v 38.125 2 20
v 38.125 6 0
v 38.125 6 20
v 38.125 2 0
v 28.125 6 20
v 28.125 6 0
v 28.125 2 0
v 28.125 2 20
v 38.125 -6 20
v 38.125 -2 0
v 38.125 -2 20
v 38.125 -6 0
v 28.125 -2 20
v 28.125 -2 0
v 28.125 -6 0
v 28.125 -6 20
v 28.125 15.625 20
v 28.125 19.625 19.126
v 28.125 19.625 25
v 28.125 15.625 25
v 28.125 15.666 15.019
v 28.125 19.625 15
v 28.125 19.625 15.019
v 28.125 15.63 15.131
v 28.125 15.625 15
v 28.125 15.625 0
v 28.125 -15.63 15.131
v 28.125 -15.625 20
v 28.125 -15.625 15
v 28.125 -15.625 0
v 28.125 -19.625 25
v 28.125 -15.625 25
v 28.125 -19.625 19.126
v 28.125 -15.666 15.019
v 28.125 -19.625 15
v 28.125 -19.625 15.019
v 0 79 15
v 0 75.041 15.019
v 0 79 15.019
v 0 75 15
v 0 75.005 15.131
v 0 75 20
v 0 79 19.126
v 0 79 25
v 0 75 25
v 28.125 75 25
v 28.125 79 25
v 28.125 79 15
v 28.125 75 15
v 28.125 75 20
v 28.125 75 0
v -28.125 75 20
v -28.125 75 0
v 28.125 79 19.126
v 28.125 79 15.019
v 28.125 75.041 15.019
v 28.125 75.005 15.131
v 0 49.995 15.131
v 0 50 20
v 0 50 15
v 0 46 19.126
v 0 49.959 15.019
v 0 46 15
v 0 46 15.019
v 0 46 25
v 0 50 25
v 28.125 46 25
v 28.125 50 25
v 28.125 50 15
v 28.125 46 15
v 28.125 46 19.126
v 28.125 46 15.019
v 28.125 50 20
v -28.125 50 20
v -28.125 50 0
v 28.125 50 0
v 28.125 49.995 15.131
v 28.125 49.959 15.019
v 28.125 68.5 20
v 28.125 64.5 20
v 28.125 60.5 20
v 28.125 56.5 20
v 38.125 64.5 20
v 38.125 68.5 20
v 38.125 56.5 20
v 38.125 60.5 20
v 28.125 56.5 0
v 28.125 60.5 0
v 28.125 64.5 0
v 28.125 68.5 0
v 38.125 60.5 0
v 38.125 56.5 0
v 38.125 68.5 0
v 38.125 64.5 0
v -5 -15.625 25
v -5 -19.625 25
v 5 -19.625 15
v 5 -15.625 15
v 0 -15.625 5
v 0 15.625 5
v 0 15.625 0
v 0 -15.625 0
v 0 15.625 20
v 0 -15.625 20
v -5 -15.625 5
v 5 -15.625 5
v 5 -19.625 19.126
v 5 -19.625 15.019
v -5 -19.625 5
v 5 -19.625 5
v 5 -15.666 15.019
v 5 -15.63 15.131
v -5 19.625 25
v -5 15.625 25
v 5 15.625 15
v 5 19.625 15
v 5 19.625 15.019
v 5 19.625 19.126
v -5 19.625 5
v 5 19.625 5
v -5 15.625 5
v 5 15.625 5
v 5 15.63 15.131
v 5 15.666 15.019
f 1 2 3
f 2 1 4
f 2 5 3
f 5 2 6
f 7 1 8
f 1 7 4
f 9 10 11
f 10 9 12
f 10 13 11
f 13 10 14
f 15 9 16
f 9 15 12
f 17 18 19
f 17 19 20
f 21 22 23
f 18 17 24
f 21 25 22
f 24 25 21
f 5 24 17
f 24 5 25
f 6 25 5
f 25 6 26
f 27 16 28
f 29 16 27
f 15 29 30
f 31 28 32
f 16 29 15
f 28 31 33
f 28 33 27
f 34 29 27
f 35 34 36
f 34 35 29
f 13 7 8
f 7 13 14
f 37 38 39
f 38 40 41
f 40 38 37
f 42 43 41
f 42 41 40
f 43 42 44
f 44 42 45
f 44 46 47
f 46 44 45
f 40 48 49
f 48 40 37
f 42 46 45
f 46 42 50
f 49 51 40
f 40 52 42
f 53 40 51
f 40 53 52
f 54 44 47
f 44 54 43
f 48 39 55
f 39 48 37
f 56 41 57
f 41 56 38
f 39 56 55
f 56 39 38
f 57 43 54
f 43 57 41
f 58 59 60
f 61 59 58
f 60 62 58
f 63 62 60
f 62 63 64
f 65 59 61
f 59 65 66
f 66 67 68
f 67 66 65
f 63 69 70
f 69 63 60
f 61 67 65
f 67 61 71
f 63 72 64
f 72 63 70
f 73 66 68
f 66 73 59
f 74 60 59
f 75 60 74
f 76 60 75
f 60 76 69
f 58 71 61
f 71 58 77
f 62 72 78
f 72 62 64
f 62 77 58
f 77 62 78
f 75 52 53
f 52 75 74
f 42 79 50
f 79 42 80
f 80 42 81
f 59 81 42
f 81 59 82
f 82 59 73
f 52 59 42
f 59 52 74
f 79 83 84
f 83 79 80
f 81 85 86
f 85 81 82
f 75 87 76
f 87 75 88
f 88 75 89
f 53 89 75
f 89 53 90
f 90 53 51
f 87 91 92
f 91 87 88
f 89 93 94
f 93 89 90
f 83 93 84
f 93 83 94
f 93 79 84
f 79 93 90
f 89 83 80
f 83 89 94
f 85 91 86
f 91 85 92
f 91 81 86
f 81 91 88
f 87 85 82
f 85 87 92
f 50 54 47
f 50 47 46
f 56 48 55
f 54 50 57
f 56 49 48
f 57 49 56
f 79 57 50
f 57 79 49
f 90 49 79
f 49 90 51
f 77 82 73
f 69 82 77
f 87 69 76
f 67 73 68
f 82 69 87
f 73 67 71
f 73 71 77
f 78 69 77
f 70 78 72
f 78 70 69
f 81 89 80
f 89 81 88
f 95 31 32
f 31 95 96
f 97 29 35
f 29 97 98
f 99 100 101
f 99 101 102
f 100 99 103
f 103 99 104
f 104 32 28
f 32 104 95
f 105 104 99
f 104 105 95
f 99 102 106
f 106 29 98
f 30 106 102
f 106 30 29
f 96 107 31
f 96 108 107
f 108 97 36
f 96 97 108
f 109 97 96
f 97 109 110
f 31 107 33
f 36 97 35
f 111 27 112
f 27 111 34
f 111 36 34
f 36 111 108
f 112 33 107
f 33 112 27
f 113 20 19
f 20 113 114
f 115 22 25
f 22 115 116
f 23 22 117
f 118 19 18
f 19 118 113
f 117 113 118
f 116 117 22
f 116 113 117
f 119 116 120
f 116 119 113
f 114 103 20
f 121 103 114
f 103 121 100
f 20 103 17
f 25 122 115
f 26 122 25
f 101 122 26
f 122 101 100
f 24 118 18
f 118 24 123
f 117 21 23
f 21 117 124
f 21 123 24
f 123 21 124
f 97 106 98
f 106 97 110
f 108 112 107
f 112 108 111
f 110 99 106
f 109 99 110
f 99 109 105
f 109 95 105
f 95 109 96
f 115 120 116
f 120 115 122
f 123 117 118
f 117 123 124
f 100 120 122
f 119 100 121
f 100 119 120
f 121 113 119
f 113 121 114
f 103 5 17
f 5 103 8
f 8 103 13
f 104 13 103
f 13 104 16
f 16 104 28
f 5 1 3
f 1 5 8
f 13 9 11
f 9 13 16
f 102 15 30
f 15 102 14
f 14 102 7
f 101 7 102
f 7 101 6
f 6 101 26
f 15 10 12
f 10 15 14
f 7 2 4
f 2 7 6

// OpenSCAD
// Goal: AC unit window mount for vertical sliding gap. Holds a piece of cardboard above an AC unit to block airflow out the window.
// Result: Abandoned. Needed to print too many of these to test. Seemed unresonable compared to getting a piece of wood cut to size.

// distance the window is opened for the AC to fit inside
WidthOfAcGap = 14.5 * 25; // inches times 2.5 = mm

// depth of the window frame. How wide the opening is that the window slides into.
WidthOfFrame = 1.25 * 25;

// thickness of the edge of the sliding window. This fits inside of WidthOfFrame.
WidthOfWindow = 1 * 25;

// How deep the window slides into the frame
DepthFrame = 1.125 * 25;

// How thick the rectangular sheet of cardboard or wood is that will be inserted into the couplers.
ThicknessFillerMaterial = 4;

/* [Hidden] */
// Remaining variables are hidden from Thingiverse

// height of stackable blocks
BlockHeight = 20; // mm

// thickness of snap to above
SnapDepth = 4;

// Height of snap to above
SnapHeight = 10;

//
// End of variables - Start of shapes
//

// The side meant to go into the frame of the window
translate([0, 2*WidthOfFrame, 0])
  Male();

// the side meant to recieve the window edge
Female();

//StackableBlock(WidthOfWindow);

// https://youtu.be/c1LKQaFIPNA use cornerRadius of 0.1 for sharp corners
module rightTriangle(side1, side2, extrudeHeight, cornerRadius){
  translate([cornerRadius,cornerRadius,0])
    hull(){
      cylinder(r=cornerRadius,h=extrudeHeight);
      translate([side1-cornerRadius*2,0,0]) cylinder(r=cornerRadius, h=extrudeHeight);
      translate([0,side2-cornerRadius*2,0]) cylinder(r=cornerRadius, h=extrudeHeight);
    }
}

module Male(){
  difference(){
    rotate([0,0,180])
      translate([-(WidthOfAcGap), -WidthOfWindow/2, 0])
        StackableBlock(WidthOfWindow);
    translate([DepthFrame, 0, -SnapHeight/2])
      FillerMaterial();
  }
}

module Female(){
  difference(){
    translate([0,-WidthOfFrame/2,0])
      StackableBlock(WidthOfFrame);
    translate([DepthFrame, 0, -SnapHeight/2])
      FillerMaterial();
  }
}

// build coupler to receieve sheet of cardboard or wood to be inserted.
//  inspiration: https://www.thingiverse.com/thing:4404861
module FillerMaterial() {
  difference(){
    translate([0,-WidthOfWindow,0])
      cube([2*WidthOfAcGap, 2 * WidthOfWindow, 2 * BlockHeight]);
    MaterialSnap();
  }
}


module MaterialSnap(){
  translate([-SnapHeight/2, ThicknessFillerMaterial/2, -BlockHeight/2])
    cube([1.5*SnapHeight, SnapDepth, 3*BlockHeight]);
  translate([-SnapHeight/2, -(ThicknessFillerMaterial/2 + SnapDepth), -BlockHeight/2])
    cube([1.5*SnapHeight, SnapDepth, 3*BlockHeight]);
}

module StackableBlock(blockWidth) {
  // snap to block above
  translate([0, -SnapDepth, BlockHeight - SnapHeight/2])
    difference(){
      cube([WidthOfAcGap, SnapDepth, SnapHeight]);
      translate([WidthOfAcGap+1,-SnapDepth,0])
        rotate([0, -90, 0])
          rightTriangle(2*SnapDepth,2*SnapDepth,WidthOfAcGap+2,0.1);
    }
  translate([0, blockWidth, BlockHeight - SnapHeight/2])
    difference(){
      cube([WidthOfAcGap, SnapDepth, SnapHeight]);
      translate([-1,2*SnapDepth,0])
        rotate([0, -90, 180])
          rightTriangle(2*SnapDepth,2*SnapDepth,WidthOfAcGap+2,0.1);
    }
  
  // snap to sliding window
  translate([-SnapHeight/2, -SnapDepth, SnapHeight/2])
    cube([SnapHeight, SnapDepth, BlockHeight]);
  translate([-SnapHeight/2, blockWidth, SnapHeight/2])
    cube([SnapHeight, SnapDepth, BlockHeight]);

  // main block
  cube([WidthOfAcGap + DepthFrame, blockWidth, BlockHeight]);
}
